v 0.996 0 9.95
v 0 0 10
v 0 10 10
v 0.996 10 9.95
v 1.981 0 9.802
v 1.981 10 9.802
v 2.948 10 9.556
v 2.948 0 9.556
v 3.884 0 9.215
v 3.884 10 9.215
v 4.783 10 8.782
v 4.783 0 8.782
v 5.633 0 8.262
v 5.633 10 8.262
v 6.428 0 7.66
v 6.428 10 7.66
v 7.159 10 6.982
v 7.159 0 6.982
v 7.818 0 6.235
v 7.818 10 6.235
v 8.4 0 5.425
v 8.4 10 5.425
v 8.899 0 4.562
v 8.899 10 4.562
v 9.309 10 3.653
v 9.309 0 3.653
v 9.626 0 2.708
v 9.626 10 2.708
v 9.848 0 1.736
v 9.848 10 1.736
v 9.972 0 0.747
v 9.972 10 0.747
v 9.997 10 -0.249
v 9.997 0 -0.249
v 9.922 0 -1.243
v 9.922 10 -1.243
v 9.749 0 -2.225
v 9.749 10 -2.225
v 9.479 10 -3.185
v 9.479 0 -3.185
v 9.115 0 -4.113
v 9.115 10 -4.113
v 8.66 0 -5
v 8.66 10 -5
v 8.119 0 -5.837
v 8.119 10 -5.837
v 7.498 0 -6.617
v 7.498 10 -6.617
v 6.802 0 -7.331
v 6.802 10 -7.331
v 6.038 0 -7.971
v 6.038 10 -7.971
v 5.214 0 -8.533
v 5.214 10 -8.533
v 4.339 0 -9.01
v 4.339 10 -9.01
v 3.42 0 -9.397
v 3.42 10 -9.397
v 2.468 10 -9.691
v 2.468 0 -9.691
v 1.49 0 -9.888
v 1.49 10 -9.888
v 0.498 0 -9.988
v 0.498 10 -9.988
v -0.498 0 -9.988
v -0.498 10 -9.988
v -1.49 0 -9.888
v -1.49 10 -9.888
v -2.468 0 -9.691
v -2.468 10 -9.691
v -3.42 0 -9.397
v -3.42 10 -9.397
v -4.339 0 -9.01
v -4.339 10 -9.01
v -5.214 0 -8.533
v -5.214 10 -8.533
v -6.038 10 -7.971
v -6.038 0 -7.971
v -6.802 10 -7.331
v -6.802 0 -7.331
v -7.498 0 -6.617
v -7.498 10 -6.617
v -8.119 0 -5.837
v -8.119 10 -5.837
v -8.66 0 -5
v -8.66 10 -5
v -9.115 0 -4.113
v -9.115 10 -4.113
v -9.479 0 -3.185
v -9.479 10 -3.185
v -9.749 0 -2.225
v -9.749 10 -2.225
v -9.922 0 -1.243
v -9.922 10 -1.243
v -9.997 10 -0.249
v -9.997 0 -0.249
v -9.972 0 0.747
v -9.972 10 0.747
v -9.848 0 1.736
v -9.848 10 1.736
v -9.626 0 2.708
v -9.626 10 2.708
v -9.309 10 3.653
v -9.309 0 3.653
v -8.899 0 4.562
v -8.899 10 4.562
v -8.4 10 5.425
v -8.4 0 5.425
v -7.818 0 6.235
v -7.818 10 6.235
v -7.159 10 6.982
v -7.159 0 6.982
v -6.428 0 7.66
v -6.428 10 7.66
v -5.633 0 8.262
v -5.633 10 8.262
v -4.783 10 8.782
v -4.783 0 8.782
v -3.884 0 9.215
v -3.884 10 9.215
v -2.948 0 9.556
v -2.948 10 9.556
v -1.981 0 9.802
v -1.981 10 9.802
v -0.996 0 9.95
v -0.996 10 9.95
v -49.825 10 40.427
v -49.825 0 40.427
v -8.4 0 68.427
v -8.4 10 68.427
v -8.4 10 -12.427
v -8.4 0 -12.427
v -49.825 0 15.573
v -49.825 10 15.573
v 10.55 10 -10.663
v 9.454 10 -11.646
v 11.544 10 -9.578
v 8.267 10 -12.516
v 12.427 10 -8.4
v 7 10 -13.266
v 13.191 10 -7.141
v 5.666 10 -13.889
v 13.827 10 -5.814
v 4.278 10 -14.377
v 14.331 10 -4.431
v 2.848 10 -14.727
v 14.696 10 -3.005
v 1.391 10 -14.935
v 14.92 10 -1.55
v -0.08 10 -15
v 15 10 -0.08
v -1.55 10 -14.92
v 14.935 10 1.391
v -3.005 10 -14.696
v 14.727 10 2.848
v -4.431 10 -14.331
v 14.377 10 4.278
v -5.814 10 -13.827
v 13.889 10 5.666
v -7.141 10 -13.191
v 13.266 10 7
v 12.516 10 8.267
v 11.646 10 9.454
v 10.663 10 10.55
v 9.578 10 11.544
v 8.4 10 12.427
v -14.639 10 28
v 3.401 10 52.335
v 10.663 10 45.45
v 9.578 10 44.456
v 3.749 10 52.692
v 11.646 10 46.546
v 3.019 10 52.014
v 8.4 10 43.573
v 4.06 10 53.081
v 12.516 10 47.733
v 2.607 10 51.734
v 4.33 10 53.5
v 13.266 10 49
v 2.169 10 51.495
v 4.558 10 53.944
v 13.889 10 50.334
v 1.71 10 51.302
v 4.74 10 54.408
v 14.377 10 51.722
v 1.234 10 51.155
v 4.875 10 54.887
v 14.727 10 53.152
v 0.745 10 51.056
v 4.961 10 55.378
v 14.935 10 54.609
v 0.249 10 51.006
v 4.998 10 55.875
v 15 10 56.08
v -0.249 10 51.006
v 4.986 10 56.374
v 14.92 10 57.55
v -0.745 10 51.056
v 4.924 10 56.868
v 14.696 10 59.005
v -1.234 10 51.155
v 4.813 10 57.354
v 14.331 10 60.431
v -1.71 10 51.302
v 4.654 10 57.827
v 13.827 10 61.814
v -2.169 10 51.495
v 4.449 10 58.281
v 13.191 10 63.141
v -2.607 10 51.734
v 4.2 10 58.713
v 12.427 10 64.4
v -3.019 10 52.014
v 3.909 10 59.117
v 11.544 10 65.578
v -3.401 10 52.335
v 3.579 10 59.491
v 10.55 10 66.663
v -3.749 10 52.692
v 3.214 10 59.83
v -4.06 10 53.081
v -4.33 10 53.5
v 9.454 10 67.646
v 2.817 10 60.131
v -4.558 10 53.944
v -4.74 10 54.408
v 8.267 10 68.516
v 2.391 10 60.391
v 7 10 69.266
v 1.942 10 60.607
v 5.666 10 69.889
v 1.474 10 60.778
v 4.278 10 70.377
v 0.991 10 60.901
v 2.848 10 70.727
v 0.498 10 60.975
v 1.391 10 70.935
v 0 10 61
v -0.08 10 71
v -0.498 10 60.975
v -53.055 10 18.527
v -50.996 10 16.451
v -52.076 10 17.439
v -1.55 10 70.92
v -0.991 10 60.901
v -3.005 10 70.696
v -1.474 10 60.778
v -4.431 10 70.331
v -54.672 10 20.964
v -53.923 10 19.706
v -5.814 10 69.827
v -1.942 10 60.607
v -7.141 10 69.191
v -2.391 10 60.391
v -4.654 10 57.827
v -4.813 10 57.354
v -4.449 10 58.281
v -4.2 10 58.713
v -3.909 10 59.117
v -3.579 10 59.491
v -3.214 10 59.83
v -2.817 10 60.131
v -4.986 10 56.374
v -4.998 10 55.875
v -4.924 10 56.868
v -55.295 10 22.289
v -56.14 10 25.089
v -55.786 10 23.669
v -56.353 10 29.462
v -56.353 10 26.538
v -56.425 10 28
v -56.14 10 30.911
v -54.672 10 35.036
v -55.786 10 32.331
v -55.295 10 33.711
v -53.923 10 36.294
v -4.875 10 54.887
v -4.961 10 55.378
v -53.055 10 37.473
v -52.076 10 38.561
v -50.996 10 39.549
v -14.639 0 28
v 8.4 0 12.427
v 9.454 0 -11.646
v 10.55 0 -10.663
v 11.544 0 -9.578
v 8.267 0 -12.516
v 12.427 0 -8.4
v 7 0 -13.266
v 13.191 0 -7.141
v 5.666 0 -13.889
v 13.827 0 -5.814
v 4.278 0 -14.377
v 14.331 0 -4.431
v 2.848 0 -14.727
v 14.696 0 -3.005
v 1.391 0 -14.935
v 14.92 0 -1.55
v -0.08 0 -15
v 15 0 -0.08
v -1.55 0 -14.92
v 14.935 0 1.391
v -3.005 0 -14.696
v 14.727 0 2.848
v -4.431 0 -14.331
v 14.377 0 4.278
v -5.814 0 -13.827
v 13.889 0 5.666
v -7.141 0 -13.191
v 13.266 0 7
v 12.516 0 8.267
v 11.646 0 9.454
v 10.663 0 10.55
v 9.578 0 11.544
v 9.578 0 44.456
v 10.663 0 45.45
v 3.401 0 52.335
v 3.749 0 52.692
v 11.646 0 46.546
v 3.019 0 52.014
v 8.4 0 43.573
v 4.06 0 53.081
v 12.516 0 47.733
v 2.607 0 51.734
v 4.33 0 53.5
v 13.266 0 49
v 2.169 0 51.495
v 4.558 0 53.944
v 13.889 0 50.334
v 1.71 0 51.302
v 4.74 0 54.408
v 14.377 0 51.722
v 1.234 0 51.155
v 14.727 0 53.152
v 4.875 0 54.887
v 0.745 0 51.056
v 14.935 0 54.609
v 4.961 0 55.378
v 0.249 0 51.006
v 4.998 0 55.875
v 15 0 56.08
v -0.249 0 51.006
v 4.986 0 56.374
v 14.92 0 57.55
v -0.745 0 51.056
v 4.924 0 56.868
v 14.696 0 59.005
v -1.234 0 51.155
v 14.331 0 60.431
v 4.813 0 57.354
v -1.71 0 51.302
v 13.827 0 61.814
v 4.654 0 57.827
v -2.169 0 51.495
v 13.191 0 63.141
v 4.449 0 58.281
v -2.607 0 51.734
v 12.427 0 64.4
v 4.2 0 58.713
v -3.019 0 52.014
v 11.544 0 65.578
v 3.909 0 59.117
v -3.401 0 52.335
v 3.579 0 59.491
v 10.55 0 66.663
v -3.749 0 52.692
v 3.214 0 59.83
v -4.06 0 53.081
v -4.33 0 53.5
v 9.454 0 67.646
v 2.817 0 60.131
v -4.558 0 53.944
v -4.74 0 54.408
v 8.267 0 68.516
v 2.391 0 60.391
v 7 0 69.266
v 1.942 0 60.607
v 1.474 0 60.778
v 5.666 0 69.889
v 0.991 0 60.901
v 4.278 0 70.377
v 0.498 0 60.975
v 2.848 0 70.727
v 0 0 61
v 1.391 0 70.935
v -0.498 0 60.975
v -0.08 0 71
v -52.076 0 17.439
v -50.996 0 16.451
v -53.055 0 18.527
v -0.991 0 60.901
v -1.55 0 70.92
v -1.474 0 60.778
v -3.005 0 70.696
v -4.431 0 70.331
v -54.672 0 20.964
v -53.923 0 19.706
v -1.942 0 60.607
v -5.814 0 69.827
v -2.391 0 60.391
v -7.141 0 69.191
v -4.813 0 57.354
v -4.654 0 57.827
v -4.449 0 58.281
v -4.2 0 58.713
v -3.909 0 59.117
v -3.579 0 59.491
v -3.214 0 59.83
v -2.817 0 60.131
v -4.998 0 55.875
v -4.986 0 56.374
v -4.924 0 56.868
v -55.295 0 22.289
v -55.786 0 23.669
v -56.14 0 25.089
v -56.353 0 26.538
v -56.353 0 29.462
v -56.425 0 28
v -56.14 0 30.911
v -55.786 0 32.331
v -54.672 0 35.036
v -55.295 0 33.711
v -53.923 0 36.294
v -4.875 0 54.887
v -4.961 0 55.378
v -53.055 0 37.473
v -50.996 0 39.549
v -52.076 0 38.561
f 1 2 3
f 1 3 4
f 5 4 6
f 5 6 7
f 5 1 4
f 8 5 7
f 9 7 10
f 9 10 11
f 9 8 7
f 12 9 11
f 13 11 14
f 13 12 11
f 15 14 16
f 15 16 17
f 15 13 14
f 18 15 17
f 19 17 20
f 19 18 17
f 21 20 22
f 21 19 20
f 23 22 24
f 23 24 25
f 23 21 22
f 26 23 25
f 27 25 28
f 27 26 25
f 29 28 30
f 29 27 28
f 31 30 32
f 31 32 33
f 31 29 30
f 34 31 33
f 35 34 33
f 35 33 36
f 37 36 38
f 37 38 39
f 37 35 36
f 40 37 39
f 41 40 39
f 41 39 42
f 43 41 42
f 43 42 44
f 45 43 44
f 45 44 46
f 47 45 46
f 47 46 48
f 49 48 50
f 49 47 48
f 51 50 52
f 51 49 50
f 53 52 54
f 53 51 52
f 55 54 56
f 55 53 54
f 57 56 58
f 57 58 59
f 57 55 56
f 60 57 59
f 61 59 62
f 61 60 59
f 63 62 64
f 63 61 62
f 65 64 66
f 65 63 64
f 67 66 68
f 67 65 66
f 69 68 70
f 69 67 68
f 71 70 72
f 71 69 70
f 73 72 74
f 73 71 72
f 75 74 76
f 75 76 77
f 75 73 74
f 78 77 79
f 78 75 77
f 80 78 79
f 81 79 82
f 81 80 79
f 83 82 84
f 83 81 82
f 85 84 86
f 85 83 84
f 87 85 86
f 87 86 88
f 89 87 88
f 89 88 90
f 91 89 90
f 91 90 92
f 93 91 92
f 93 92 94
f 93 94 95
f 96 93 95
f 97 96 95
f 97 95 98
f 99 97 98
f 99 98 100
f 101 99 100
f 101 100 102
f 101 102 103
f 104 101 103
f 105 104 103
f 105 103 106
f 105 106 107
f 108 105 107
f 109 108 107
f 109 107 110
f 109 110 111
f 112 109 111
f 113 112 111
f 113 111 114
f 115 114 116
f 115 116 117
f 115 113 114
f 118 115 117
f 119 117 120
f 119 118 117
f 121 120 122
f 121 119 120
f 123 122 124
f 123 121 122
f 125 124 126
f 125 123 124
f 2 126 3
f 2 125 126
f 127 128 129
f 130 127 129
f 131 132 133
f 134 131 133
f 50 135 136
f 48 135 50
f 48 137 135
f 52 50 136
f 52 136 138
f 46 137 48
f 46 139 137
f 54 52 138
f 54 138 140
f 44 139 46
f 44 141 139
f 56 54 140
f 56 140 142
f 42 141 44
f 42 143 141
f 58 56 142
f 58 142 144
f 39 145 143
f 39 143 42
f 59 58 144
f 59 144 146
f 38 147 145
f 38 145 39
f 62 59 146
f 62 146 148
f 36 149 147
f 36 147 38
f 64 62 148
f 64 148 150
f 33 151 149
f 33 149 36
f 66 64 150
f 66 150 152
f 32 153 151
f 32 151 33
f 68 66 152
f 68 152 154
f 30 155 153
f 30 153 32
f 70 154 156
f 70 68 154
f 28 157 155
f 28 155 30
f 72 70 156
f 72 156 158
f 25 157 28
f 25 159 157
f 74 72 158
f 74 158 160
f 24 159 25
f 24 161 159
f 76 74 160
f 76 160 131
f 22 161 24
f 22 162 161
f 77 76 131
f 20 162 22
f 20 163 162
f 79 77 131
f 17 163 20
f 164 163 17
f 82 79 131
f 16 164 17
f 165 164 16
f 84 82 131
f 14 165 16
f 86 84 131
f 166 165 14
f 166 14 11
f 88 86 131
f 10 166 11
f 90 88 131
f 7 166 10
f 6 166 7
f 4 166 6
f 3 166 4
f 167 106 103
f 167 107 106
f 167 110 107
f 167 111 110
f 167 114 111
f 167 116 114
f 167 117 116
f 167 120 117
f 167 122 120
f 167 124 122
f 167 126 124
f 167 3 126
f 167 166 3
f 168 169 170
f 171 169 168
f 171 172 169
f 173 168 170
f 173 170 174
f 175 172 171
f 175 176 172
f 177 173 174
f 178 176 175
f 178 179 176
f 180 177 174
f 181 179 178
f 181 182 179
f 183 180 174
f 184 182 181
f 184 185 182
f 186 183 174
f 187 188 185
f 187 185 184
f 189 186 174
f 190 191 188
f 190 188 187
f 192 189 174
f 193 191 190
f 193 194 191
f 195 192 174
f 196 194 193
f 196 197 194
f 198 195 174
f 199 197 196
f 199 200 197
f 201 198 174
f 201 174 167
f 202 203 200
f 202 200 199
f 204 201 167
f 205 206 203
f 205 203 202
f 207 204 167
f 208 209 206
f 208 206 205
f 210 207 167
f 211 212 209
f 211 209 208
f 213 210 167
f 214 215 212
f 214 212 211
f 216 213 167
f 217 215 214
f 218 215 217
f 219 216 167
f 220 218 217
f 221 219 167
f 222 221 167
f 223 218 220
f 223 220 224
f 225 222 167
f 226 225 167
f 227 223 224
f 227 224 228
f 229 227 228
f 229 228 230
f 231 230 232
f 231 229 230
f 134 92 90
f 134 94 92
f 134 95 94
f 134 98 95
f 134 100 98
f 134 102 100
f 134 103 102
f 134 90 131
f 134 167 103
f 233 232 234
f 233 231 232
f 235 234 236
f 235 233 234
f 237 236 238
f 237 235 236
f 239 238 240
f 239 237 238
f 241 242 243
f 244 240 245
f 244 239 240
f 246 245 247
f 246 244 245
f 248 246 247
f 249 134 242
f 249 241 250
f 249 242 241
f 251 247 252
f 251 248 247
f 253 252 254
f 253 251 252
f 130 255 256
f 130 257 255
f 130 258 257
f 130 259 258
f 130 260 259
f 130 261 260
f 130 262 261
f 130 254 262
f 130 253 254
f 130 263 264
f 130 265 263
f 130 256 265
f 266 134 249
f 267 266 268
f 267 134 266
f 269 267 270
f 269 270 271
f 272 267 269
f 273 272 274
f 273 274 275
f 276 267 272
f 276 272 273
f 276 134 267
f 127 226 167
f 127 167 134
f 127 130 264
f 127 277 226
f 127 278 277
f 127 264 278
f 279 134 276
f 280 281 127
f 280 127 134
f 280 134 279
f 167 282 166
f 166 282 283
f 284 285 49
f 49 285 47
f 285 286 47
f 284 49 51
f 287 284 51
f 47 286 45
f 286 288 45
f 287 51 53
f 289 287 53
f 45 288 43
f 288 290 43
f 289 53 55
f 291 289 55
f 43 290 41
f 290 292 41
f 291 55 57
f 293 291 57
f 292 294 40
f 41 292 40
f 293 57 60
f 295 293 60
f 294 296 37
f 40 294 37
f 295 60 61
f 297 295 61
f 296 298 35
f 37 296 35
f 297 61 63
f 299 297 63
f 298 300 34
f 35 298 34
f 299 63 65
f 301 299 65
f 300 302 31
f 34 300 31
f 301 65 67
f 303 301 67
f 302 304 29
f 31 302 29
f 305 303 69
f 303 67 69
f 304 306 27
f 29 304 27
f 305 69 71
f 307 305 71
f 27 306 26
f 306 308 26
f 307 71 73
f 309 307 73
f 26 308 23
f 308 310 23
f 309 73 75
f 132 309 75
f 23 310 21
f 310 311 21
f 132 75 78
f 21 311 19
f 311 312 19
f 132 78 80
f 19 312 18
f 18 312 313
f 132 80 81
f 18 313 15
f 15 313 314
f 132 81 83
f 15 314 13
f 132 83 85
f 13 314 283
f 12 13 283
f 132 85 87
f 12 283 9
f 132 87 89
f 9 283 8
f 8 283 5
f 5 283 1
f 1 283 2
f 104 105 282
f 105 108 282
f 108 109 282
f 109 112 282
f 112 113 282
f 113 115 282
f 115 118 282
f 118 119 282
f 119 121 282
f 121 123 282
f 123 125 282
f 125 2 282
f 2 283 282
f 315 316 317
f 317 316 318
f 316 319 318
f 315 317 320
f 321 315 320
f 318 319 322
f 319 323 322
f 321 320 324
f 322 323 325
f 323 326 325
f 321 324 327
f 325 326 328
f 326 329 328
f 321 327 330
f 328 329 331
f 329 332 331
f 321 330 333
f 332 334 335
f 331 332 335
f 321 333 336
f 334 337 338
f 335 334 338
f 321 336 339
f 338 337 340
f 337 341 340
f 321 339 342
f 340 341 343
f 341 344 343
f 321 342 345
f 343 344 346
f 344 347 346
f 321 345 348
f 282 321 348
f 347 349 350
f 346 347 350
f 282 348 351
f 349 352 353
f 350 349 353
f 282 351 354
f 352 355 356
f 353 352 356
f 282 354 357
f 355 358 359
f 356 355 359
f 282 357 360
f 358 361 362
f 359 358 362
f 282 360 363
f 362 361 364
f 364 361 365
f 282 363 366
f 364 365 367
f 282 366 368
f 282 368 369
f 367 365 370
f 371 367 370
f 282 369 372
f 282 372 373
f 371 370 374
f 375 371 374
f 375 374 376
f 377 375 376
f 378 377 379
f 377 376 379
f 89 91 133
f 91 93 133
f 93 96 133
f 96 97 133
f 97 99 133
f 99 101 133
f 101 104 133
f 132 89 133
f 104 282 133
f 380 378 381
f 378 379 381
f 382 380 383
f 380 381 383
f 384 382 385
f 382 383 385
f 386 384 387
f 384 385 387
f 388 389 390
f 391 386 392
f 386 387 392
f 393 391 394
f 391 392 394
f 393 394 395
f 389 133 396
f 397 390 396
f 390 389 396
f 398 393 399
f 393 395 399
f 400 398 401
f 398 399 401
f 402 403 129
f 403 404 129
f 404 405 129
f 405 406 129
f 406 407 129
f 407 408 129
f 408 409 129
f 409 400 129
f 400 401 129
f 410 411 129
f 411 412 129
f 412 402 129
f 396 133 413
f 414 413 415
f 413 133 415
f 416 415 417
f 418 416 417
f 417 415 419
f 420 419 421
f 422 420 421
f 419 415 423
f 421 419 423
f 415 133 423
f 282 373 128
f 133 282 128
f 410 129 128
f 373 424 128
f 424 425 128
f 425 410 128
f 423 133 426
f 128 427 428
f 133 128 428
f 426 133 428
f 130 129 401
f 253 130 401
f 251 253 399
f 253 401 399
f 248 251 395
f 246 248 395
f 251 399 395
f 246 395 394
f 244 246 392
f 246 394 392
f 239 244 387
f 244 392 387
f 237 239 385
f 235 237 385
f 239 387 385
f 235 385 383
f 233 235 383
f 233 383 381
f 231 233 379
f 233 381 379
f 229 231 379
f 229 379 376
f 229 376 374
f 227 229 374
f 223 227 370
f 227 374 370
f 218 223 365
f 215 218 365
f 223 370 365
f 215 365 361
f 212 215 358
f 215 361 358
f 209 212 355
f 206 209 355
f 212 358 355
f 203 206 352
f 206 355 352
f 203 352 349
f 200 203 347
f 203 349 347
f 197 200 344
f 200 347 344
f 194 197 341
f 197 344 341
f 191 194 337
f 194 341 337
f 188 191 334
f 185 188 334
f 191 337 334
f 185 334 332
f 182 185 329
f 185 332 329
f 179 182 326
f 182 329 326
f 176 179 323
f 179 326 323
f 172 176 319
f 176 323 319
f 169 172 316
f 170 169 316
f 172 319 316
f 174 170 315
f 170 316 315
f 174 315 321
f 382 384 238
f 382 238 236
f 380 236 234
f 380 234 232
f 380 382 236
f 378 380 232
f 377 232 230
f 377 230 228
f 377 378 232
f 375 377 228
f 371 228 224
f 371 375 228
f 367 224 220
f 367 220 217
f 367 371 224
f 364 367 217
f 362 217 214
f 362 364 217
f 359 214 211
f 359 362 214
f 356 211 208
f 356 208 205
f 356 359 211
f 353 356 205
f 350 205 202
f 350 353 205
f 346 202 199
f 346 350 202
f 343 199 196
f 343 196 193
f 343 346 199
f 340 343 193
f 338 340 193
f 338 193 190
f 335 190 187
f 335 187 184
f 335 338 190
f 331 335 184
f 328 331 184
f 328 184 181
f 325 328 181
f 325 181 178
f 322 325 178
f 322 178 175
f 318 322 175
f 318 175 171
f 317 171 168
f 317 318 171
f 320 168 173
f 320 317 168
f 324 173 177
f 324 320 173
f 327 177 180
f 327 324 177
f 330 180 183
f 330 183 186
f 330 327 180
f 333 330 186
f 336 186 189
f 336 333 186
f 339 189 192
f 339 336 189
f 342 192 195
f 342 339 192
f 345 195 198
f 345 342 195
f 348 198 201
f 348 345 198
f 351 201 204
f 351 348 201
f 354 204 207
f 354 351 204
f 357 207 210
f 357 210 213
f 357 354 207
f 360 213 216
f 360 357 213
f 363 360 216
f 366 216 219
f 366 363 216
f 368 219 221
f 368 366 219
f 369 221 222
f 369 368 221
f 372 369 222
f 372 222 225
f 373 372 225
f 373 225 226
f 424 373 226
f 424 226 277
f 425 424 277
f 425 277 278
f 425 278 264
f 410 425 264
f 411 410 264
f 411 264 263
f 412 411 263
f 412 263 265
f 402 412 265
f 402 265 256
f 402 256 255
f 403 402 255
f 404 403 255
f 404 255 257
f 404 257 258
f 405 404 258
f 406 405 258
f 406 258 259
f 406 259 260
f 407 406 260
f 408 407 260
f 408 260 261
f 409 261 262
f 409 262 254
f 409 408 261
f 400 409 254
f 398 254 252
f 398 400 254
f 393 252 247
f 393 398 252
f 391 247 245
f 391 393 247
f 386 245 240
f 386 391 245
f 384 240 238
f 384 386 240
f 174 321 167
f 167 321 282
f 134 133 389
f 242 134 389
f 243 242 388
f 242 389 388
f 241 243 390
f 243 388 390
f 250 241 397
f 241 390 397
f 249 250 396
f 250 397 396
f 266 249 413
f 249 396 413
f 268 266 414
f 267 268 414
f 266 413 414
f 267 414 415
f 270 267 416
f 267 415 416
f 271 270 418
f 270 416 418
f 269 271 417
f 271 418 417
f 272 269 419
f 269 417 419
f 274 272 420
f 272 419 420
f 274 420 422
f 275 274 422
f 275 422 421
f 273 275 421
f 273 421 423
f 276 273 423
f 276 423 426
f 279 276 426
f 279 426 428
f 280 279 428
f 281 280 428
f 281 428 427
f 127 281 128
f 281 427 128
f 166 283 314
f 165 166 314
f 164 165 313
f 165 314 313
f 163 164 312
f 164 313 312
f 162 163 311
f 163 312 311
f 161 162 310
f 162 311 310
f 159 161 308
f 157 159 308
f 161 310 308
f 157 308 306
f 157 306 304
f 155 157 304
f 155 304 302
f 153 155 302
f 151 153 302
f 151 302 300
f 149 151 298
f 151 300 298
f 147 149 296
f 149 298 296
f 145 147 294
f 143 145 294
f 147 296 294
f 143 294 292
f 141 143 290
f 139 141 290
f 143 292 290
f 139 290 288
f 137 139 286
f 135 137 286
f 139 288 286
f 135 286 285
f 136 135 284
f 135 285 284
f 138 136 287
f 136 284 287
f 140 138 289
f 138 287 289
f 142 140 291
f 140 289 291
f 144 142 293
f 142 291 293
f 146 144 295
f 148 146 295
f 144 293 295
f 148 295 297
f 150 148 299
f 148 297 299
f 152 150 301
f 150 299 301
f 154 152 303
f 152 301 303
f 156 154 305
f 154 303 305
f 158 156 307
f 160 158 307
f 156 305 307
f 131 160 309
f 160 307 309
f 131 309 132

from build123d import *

# Parameters (mm, degrees)
SKETCH1_R           = 10
SKETCH1_R_2         = 5
BOSS_EXTRUDE1_DEPTH = 10


with BuildPart() as part:
    # Sketch1 → Boss-Extrude1 (new body)
    with BuildSketch(Plane(origin=(0, 0, 0), x_dir=(-1, 0, 0), z_dir=(0, 1, 0))):
        with BuildLine():
            Line((8.4, -12.427389106), (49.824630354, 15.572610894))
            ThreePointArc((49.824630354, 15.572610894), (56.424630354, 28), (49.824630354, 40.427389106))
            Line((49.824630354, 40.427389106), (8.4, 68.427389106))
            ThreePointArc((8.4, 68.427389106), (-12.427389106, 64.4), (-8.4, 43.572610894))
            Line((-8.4, 43.572610894), (14.638916069, 28))
            Line((14.638916069, 28), (-8.4, 12.427389106))
            ThreePointArc((-8.4, 12.427389106), (-12.427389106, -8.4), (8.4, -12.427389106))
        make_face()
        with Locations(Location((0, 0, 0), (0, 0, 90))):
            Circle(SKETCH1_R, mode=Mode.SUBTRACT)
        with Locations(Location((0, 56, 0), (0, 0, 90))):
            Circle(SKETCH1_R_2, mode=Mode.SUBTRACT)
    extrude(amount=BOSS_EXTRUDE1_DEPTH)


solid = part.part
